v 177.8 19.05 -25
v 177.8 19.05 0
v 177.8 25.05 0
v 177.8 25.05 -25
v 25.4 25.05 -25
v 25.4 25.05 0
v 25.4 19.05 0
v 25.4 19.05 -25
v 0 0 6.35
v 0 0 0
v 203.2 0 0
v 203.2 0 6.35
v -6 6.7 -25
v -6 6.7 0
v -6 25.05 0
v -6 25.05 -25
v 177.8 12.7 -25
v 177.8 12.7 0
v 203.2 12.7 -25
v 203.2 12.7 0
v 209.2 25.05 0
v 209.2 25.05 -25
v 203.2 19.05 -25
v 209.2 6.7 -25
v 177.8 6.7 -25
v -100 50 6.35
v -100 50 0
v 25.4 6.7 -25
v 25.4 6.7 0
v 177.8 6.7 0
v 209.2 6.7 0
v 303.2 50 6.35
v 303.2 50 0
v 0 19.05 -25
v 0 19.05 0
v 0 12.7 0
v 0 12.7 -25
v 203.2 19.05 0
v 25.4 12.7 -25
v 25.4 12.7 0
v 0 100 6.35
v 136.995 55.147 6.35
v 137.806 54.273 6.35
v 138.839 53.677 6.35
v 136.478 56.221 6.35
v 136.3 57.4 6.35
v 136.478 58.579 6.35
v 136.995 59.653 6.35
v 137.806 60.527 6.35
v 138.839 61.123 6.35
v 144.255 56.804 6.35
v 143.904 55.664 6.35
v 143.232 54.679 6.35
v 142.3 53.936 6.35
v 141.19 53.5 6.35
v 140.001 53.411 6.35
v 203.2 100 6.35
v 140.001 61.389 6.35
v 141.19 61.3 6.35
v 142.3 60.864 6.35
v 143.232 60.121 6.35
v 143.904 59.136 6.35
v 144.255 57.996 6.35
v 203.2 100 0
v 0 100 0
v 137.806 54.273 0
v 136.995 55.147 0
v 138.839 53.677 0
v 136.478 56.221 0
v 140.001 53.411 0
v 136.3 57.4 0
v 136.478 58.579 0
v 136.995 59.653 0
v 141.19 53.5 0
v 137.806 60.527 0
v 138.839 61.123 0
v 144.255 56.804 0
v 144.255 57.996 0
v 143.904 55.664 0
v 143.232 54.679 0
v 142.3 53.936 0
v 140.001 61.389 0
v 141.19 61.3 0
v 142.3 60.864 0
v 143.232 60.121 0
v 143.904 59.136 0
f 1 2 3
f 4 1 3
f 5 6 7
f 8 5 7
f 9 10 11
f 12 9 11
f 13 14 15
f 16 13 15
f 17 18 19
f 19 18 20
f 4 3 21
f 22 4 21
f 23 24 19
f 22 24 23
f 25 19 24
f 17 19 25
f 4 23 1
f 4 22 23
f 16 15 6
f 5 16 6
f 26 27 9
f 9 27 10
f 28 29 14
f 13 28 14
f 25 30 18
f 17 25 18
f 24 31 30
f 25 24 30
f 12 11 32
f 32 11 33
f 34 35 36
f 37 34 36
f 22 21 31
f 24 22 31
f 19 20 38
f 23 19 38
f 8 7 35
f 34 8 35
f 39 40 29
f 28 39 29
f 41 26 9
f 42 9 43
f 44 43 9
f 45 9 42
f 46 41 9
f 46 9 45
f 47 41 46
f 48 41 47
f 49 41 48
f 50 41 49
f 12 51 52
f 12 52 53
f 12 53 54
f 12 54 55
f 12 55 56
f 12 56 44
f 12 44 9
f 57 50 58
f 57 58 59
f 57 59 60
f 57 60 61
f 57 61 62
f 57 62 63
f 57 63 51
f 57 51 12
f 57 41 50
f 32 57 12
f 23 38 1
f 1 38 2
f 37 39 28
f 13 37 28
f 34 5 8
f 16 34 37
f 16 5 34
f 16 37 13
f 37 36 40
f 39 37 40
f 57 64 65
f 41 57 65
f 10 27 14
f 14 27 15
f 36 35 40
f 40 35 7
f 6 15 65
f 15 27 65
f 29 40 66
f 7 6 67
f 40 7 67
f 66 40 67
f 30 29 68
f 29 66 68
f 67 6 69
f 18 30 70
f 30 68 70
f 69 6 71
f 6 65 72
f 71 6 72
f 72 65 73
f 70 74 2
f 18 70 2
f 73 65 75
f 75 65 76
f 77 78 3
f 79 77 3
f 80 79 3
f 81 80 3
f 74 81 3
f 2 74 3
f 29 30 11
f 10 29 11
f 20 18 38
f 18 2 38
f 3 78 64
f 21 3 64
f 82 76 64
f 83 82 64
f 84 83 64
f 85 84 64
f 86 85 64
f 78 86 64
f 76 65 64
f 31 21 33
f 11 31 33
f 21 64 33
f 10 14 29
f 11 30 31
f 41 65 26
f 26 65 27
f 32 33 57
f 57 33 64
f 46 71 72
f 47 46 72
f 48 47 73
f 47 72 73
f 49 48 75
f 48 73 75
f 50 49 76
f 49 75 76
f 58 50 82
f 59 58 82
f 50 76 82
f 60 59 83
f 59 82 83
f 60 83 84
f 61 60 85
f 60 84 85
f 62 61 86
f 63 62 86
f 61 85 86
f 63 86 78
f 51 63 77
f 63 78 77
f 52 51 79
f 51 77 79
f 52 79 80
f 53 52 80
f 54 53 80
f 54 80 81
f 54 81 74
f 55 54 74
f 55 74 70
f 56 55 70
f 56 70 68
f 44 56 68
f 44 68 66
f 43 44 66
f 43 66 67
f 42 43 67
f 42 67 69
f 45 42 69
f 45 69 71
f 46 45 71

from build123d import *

# Parameters (mm, degrees)
BOSS_EXTRUDE1_DEPTH = 6.35
BOSS_EXTRUDE3_DEPTH = 25
SKETCH3_R           = 4
CUT_EXTRUDE1_DEPTH  = 25


with BuildPart() as part:
    # Sketch1 → Boss-Extrude1 (new body)
    with BuildSketch(Plane.XY):
        Polygon((0, 0), (203.2, 0), (303.2, 50), (203.2, 100), (0, 100), (-100, 50), align=None)
    extrude(amount=BOSS_EXTRUDE1_DEPTH)

    # Sketch2 → Boss-Extrude3 (add)
    with BuildSketch(Plane(origin=(0, 0, 0), x_dir=(-1, 0, 0), z_dir=(0, 0, -1))):
        Polygon((-177.8, 12.7), (-203.2, 12.7), (-203.2, 19.05), (-177.8, 19.05), (-177.8, 25.05), (-209.2, 25.05), (-209.2, 6.7), (-177.8, 6.7), align=None)
        Polygon((6, 6.7), (6, 25.05), (-25.4, 25.05), (-25.4, 19.05), (0, 19.05), (0, 12.7), (-25.4, 12.7), (-25.4, 6.7), align=None)
    extrude(amount=BOSS_EXTRUDE3_DEPTH)

    # Sketch3 → Cut-Extrude1 (cut)
    with BuildSketch(Plane(origin=(0, 0, 0), x_dir=(-1, 0, 0), z_dir=(0, 0, -1))):
        with Locations((-140.3, 57.4)):
            Circle(SKETCH3_R)
    extrude(amount=-CUT_EXTRUDE1_DEPTH, mode=Mode.SUBTRACT)


solid = part.part
